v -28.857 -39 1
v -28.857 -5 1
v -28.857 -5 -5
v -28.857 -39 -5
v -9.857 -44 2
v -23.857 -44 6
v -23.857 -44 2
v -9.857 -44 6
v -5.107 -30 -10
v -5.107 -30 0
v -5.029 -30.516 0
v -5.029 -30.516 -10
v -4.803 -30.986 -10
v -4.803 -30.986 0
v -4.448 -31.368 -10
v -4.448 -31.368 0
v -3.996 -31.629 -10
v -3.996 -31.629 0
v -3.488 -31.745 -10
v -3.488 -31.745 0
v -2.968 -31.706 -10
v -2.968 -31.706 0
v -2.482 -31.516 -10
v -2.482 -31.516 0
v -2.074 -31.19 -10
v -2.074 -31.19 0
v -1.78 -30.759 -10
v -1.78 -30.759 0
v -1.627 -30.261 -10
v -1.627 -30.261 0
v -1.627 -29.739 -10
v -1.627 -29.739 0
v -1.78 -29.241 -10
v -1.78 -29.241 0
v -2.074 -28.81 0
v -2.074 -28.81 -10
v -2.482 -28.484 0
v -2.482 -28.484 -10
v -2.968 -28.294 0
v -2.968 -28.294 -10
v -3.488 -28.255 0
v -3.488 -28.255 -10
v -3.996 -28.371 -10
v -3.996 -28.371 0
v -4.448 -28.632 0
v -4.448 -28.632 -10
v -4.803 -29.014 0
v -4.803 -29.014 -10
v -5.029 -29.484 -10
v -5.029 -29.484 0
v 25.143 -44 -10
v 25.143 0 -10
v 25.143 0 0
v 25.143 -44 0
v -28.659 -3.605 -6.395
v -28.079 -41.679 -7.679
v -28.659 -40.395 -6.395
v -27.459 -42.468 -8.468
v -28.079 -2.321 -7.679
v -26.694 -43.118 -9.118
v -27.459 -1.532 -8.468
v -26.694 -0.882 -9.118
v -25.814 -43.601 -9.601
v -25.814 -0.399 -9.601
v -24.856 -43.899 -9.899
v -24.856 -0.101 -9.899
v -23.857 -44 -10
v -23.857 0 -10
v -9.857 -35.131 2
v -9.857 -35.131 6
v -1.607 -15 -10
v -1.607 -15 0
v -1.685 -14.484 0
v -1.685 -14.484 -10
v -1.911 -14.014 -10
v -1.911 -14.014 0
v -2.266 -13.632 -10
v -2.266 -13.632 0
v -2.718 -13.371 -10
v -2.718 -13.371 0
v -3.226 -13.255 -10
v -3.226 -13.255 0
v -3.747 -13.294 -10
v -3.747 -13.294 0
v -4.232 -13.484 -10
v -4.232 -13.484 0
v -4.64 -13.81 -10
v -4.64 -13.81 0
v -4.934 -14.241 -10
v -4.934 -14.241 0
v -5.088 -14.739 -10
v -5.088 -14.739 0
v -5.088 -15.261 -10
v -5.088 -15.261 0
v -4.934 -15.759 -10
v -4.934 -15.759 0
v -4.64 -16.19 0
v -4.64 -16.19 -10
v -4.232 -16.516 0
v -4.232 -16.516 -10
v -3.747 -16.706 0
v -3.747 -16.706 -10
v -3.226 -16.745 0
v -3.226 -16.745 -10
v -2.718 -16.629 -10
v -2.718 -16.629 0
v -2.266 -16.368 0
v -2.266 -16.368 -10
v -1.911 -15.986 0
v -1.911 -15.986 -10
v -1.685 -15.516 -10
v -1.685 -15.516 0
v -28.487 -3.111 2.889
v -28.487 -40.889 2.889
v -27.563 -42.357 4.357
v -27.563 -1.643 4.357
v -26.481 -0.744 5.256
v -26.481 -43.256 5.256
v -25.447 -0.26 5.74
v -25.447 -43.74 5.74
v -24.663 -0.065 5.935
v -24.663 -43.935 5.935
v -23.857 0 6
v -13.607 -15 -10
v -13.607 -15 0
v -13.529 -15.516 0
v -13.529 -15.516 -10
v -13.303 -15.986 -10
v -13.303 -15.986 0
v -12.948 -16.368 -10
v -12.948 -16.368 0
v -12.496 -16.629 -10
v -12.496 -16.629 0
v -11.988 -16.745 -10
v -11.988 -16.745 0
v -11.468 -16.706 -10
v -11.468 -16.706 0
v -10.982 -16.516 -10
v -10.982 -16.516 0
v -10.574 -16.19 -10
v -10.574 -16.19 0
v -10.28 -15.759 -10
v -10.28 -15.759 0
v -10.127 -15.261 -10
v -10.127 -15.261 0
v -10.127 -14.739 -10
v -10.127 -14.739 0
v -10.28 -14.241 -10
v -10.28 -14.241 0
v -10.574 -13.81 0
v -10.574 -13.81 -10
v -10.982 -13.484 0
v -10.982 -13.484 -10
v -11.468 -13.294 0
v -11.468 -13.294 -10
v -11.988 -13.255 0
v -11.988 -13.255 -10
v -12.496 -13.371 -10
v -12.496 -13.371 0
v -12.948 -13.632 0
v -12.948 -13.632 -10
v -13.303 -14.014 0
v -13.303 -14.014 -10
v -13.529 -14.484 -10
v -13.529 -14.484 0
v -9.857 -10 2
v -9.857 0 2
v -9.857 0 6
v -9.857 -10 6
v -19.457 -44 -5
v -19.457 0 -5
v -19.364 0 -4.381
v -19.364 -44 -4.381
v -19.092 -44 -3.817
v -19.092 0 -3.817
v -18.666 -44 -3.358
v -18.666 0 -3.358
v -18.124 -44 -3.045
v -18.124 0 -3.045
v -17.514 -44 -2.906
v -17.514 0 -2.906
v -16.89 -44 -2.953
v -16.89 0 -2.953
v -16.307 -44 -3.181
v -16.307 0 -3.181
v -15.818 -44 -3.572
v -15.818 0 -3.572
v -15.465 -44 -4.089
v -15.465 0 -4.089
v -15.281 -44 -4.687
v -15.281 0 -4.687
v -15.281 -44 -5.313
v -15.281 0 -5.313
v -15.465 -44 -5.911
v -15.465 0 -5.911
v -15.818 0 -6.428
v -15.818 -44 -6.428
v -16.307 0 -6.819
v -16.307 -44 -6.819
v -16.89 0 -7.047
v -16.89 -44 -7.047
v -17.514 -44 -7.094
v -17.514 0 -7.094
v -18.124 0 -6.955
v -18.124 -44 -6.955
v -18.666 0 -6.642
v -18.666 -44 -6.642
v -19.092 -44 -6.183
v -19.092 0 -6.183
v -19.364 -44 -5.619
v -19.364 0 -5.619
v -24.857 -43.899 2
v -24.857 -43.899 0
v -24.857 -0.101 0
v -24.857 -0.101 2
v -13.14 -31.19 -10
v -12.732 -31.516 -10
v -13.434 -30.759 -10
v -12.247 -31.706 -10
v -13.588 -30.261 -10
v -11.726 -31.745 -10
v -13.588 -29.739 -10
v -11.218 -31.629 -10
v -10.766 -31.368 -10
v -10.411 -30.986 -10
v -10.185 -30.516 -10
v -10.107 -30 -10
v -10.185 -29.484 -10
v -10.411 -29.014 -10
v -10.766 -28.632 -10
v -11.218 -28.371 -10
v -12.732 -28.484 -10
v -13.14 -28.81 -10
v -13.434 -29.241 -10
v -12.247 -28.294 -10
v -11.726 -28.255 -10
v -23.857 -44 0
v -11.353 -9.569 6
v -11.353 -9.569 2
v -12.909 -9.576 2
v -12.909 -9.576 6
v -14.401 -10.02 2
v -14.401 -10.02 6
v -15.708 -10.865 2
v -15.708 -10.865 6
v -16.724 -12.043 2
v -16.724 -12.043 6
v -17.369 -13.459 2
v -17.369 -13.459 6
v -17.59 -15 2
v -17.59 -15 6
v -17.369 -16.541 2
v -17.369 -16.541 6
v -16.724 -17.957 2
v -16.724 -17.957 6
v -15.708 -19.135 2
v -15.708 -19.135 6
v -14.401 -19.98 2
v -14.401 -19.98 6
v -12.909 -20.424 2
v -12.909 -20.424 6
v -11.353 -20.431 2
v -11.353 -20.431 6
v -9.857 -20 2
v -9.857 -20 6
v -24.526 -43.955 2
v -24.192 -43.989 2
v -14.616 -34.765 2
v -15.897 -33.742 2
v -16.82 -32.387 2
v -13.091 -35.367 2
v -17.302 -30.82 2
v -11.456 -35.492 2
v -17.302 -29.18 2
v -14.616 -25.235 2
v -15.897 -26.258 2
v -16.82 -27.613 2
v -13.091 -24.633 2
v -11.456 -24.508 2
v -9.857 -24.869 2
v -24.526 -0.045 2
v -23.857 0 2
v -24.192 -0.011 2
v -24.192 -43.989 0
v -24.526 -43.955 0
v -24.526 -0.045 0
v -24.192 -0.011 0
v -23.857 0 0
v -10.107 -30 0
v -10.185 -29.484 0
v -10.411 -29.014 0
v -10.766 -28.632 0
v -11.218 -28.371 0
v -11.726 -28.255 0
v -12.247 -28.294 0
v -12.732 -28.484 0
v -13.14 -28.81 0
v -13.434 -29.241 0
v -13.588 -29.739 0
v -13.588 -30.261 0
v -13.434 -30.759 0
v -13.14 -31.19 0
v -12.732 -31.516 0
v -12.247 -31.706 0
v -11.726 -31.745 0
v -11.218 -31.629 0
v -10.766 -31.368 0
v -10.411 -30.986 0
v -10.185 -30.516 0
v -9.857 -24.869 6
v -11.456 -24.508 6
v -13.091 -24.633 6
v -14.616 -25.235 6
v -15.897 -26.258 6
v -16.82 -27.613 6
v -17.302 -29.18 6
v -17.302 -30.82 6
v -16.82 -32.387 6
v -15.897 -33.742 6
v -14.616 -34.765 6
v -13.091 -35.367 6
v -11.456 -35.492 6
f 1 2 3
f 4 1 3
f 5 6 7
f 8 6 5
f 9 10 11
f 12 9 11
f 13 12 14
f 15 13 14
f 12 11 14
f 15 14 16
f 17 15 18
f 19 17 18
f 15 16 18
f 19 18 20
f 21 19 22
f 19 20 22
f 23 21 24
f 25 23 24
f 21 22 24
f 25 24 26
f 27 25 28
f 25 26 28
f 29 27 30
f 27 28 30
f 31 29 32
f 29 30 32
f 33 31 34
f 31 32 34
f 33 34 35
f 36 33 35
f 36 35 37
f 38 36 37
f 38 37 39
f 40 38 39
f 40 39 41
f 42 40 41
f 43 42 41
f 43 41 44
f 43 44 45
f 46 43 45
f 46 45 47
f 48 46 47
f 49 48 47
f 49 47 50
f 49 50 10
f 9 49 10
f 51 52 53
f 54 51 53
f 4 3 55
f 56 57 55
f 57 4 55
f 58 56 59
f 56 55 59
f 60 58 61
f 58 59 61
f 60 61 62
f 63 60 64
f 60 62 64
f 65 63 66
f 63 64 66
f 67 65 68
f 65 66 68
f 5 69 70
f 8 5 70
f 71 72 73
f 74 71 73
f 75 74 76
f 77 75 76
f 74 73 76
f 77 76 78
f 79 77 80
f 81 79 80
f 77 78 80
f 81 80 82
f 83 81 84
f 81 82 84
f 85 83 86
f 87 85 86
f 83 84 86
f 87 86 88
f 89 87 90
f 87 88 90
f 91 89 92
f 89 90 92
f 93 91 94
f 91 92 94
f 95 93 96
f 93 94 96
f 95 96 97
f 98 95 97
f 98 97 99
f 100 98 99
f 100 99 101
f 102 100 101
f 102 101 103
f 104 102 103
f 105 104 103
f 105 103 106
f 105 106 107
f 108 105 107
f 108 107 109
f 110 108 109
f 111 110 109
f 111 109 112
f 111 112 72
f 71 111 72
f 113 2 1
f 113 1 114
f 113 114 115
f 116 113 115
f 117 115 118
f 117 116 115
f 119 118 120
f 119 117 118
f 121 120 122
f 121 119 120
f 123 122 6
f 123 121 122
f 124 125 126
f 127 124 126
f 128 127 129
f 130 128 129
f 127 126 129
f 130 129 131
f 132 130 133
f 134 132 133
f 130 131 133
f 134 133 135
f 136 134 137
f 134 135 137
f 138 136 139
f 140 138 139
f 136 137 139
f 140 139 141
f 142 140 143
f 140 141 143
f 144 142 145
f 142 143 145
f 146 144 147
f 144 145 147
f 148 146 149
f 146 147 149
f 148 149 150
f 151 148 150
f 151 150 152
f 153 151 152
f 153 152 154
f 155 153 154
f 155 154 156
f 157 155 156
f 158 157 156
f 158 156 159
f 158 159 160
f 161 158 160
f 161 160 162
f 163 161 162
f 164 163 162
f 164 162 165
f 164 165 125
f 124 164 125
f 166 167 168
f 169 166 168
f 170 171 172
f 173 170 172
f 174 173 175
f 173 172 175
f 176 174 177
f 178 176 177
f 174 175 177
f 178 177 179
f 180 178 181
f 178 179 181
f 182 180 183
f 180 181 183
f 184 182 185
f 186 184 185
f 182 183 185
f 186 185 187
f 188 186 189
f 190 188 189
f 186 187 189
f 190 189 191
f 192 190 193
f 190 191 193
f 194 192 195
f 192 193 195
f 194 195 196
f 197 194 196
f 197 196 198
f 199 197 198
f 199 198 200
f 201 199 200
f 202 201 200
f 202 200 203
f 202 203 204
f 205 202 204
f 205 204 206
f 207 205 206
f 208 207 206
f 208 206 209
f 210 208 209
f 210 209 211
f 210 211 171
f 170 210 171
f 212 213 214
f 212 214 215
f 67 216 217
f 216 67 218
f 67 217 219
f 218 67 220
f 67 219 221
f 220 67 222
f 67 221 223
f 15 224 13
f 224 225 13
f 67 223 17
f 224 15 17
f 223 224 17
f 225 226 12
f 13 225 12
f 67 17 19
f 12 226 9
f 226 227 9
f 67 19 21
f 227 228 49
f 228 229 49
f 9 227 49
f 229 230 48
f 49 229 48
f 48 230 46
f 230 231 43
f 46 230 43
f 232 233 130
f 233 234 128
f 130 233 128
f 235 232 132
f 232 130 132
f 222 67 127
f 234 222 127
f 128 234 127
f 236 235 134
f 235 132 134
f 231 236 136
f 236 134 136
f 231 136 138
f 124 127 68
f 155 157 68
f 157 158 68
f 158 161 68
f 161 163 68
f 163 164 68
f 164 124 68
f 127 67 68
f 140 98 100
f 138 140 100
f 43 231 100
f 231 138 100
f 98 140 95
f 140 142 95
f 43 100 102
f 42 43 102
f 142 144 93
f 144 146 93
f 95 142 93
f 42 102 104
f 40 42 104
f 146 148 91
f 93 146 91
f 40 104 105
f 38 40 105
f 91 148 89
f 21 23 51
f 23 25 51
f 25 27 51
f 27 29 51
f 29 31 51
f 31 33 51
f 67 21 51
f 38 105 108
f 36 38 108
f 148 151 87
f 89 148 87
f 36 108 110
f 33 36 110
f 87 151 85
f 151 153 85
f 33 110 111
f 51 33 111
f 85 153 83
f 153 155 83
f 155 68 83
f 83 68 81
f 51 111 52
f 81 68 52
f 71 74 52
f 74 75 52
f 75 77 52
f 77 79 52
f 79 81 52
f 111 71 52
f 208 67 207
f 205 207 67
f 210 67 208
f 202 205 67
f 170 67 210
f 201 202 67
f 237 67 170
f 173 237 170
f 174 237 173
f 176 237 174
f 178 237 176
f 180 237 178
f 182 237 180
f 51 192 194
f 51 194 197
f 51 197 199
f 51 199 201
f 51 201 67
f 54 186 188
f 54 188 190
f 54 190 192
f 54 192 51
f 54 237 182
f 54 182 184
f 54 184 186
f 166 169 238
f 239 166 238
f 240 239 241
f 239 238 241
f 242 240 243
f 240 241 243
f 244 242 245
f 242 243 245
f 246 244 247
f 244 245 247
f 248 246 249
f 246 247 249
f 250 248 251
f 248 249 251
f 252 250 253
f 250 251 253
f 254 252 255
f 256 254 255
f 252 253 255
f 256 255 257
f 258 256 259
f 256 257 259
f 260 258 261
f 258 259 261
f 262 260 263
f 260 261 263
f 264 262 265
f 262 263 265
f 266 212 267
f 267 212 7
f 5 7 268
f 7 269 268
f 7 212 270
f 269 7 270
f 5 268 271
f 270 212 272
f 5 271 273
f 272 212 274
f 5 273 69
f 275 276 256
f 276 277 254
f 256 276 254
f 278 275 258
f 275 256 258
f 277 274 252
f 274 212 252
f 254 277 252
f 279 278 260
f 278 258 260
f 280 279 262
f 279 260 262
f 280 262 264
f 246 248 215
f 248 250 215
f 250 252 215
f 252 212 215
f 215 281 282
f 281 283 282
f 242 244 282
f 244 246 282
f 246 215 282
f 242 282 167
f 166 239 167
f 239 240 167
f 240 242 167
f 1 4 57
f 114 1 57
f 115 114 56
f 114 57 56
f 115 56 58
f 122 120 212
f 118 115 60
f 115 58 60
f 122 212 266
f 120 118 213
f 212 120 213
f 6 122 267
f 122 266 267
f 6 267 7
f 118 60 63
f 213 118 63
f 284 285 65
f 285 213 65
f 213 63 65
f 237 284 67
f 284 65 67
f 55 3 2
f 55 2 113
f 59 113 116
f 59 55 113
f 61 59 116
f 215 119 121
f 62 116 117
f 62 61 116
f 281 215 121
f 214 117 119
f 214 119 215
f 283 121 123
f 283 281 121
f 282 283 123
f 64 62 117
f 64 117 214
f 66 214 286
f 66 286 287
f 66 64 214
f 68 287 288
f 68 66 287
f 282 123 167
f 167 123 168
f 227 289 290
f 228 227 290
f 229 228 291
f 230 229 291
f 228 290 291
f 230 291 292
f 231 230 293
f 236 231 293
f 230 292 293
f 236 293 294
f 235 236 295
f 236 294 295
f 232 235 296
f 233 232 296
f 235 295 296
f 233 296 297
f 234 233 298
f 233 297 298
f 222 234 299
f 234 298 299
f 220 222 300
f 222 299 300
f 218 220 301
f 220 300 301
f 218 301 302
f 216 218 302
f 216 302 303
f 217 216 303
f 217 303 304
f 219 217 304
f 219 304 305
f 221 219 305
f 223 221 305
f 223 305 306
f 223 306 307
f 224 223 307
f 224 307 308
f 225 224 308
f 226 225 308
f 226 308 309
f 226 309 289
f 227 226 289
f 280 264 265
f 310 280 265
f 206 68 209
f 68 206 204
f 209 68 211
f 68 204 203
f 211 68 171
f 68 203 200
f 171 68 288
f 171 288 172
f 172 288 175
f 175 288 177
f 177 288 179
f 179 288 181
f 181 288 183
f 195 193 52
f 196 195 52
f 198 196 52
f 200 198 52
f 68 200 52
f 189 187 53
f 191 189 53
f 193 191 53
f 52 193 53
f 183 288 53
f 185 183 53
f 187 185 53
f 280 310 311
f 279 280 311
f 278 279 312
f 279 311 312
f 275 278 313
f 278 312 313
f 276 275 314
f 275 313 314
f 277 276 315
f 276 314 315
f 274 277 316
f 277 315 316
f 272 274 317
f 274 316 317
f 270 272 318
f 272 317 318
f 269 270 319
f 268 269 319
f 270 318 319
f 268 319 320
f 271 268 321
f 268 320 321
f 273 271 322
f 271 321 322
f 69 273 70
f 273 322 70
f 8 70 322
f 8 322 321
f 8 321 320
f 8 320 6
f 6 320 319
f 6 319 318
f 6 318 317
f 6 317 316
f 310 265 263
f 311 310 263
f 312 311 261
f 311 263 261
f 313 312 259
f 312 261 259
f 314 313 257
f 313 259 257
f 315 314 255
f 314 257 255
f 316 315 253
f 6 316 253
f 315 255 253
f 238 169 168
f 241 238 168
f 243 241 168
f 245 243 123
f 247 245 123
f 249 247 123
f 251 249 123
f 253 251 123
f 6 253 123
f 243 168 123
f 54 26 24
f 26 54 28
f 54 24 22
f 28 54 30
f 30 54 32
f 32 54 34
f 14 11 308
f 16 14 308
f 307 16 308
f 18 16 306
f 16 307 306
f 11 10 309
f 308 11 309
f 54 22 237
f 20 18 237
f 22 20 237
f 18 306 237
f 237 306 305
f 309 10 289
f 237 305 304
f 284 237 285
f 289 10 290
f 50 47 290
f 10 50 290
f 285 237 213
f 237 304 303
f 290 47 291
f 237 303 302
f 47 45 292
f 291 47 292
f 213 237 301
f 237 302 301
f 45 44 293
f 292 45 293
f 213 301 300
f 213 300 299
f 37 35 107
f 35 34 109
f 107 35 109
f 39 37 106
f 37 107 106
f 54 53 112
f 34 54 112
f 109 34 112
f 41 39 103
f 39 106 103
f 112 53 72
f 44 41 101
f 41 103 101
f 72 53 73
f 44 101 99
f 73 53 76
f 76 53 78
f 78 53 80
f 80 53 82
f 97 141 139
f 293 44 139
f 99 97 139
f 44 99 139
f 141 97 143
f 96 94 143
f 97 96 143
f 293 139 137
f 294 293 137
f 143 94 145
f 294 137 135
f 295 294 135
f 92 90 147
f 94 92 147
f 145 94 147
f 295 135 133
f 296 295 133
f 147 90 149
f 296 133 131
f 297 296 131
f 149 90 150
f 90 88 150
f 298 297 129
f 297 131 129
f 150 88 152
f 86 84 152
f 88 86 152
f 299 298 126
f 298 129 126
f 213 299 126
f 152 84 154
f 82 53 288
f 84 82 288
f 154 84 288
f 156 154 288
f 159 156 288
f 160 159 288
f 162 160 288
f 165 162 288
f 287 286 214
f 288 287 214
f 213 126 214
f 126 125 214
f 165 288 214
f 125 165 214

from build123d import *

# Parameters (mm, degrees)
F0_W         = 15
F0_H         = 4
F1_DEPTH     = 44
F3_D         = 3.5
F4_R         = 1.75
F5_DEPTH     = 4
F7_D         = 4.2
F9_D         = 3.5
F9_DEPTH     = 10.001
F11_DEPTH    = 4
F12_T1_DEPTH = 69
F12_T3_DEPTH = 41


# Not quite as in the source:
# - a fillet or chamfer that OpenCascade refuses, or shapes differently, is made with other operations: its cross-section is extruded or revolved along the edge and cut away or added


with BuildPart() as f1:
    # F0 (on Front) → F1 (new body)
    with BuildSketch(Plane.XZ):
        Polygon((-28.8571389138, 6), (-28.8571389138, 0), (-24.8571389138, 0), (-24.8571389138, 2), (-24.8571389138, 6), align=None)
        Polygon((-24.8571389138, 0), (-28.8571389138, 0), (-28.8571389138, -10), (25.1428610862, -10), (25.1428610862, 0), align=None)
        with Locations((-17.3571389138, 4)):
            Rectangle(F0_W, F0_H)
    extrude(amount=F1_DEPTH)

    # F3 (through all)
    with Locations(Plane(origin=(0, 0, -10), x_dir=(1, 0, 0), z_dir=(0, 0, -1))):
        with Locations((-11.8571389138, 15), (-3.3571389138, 30)):
            Hole(F3_D / 2)

    # F4 (on face) → F5 (cut)
    with BuildSketch(Plane.XY.offset(6)):
        with BuildLine():
            Line((-9.8571389138, -20), (-9.8571389138, -10))
            ThreePointArc((-9.8571389138, -10), (-17.5900669637, -15), (-9.8571389138, -20))
        make_face()
        with Locations((-11.8571389138, -15)):
            Circle(F4_R, mode=Mode.SUBTRACT)
    extrude(amount=-F5_DEPTH, mode=Mode.SUBTRACT)

    # F7 (through all)
    with Locations(Plane.XZ.offset(44)):
        with Locations((-17.3571389138, -5)):
            Hole(F7_D / 2)

    # F9 (through all, one way)
    with BuildSketch(Plane.XY):
        with Locations((-3.3571389138, -15), (-11.8571389138, -30)):
            Circle(F9_D / 2)
    extrude(amount=-F9_DEPTH, mode=Mode.SUBTRACT)

    # F10 (on face) → F11 (cut, through all)
    with BuildSketch(Plane.XY.offset(6)):
        with BuildLine():
            Line((-9.8571389138, -35.1305356622), (-9.8571389138, -24.8694643378))
            ThreePointArc((-9.8571389138, -24.8694643378), (-17.3637164517, -30), (-9.8571389138, -35.1305356622))
        make_face()
    extrude(amount=-F11_DEPTH, mode=Mode.SUBTRACT)

    # F12: fillet of radius 5 on 4 edges, made by hand

    # F12_s2 → F12_t1 (cut)
    with BuildSketch(Plane.XZ.offset(-12.5)):
        with BuildLine():
            ThreePointArc((-28.8571389138, 1), (-27.3926728198, 4.5355339059), (-23.8571389138, 6))
            Line((-23.8571389138, 6), (-28.8571389138, 6))
            Line((-28.8571389138, 6), (-28.8571389138, 1))
        make_face()
        with BuildLine():
            ThreePointArc((-28.8571389138, -5), (-27.3926728198, -8.5355339059), (-23.8571389138, -10))
            Line((-23.8571389138, -10), (-28.8571389138, -10))
            Line((-28.8571389138, -10), (-28.8571389138, -5))
        make_face()
    extrude(amount=F12_T1_DEPTH, mode=Mode.SUBTRACT)

    # F12_s4 → F12_t3 (cut)
    with BuildSketch(Plane.XY.offset(-22.5)):
        with BuildLine():
            ThreePointArc((-28.8571389138, -5), (-27.3926728198, -1.4644660941), (-23.8571389138, 0))
            Line((-23.8571389138, 0), (-28.8571389138, 0))
            Line((-28.8571389138, 0), (-28.8571389138, -5))
        make_face()
        with BuildLine():
            ThreePointArc((-28.8571389138, -39), (-27.3926728198, -42.5355339059), (-23.8571389138, -44))
            Line((-23.8571389138, -44), (-28.8571389138, -44))
            Line((-28.8571389138, -44), (-28.8571389138, -39))
        make_face()
    extrude(amount=F12_T3_DEPTH, mode=Mode.SUBTRACT)


solid = f1.part
